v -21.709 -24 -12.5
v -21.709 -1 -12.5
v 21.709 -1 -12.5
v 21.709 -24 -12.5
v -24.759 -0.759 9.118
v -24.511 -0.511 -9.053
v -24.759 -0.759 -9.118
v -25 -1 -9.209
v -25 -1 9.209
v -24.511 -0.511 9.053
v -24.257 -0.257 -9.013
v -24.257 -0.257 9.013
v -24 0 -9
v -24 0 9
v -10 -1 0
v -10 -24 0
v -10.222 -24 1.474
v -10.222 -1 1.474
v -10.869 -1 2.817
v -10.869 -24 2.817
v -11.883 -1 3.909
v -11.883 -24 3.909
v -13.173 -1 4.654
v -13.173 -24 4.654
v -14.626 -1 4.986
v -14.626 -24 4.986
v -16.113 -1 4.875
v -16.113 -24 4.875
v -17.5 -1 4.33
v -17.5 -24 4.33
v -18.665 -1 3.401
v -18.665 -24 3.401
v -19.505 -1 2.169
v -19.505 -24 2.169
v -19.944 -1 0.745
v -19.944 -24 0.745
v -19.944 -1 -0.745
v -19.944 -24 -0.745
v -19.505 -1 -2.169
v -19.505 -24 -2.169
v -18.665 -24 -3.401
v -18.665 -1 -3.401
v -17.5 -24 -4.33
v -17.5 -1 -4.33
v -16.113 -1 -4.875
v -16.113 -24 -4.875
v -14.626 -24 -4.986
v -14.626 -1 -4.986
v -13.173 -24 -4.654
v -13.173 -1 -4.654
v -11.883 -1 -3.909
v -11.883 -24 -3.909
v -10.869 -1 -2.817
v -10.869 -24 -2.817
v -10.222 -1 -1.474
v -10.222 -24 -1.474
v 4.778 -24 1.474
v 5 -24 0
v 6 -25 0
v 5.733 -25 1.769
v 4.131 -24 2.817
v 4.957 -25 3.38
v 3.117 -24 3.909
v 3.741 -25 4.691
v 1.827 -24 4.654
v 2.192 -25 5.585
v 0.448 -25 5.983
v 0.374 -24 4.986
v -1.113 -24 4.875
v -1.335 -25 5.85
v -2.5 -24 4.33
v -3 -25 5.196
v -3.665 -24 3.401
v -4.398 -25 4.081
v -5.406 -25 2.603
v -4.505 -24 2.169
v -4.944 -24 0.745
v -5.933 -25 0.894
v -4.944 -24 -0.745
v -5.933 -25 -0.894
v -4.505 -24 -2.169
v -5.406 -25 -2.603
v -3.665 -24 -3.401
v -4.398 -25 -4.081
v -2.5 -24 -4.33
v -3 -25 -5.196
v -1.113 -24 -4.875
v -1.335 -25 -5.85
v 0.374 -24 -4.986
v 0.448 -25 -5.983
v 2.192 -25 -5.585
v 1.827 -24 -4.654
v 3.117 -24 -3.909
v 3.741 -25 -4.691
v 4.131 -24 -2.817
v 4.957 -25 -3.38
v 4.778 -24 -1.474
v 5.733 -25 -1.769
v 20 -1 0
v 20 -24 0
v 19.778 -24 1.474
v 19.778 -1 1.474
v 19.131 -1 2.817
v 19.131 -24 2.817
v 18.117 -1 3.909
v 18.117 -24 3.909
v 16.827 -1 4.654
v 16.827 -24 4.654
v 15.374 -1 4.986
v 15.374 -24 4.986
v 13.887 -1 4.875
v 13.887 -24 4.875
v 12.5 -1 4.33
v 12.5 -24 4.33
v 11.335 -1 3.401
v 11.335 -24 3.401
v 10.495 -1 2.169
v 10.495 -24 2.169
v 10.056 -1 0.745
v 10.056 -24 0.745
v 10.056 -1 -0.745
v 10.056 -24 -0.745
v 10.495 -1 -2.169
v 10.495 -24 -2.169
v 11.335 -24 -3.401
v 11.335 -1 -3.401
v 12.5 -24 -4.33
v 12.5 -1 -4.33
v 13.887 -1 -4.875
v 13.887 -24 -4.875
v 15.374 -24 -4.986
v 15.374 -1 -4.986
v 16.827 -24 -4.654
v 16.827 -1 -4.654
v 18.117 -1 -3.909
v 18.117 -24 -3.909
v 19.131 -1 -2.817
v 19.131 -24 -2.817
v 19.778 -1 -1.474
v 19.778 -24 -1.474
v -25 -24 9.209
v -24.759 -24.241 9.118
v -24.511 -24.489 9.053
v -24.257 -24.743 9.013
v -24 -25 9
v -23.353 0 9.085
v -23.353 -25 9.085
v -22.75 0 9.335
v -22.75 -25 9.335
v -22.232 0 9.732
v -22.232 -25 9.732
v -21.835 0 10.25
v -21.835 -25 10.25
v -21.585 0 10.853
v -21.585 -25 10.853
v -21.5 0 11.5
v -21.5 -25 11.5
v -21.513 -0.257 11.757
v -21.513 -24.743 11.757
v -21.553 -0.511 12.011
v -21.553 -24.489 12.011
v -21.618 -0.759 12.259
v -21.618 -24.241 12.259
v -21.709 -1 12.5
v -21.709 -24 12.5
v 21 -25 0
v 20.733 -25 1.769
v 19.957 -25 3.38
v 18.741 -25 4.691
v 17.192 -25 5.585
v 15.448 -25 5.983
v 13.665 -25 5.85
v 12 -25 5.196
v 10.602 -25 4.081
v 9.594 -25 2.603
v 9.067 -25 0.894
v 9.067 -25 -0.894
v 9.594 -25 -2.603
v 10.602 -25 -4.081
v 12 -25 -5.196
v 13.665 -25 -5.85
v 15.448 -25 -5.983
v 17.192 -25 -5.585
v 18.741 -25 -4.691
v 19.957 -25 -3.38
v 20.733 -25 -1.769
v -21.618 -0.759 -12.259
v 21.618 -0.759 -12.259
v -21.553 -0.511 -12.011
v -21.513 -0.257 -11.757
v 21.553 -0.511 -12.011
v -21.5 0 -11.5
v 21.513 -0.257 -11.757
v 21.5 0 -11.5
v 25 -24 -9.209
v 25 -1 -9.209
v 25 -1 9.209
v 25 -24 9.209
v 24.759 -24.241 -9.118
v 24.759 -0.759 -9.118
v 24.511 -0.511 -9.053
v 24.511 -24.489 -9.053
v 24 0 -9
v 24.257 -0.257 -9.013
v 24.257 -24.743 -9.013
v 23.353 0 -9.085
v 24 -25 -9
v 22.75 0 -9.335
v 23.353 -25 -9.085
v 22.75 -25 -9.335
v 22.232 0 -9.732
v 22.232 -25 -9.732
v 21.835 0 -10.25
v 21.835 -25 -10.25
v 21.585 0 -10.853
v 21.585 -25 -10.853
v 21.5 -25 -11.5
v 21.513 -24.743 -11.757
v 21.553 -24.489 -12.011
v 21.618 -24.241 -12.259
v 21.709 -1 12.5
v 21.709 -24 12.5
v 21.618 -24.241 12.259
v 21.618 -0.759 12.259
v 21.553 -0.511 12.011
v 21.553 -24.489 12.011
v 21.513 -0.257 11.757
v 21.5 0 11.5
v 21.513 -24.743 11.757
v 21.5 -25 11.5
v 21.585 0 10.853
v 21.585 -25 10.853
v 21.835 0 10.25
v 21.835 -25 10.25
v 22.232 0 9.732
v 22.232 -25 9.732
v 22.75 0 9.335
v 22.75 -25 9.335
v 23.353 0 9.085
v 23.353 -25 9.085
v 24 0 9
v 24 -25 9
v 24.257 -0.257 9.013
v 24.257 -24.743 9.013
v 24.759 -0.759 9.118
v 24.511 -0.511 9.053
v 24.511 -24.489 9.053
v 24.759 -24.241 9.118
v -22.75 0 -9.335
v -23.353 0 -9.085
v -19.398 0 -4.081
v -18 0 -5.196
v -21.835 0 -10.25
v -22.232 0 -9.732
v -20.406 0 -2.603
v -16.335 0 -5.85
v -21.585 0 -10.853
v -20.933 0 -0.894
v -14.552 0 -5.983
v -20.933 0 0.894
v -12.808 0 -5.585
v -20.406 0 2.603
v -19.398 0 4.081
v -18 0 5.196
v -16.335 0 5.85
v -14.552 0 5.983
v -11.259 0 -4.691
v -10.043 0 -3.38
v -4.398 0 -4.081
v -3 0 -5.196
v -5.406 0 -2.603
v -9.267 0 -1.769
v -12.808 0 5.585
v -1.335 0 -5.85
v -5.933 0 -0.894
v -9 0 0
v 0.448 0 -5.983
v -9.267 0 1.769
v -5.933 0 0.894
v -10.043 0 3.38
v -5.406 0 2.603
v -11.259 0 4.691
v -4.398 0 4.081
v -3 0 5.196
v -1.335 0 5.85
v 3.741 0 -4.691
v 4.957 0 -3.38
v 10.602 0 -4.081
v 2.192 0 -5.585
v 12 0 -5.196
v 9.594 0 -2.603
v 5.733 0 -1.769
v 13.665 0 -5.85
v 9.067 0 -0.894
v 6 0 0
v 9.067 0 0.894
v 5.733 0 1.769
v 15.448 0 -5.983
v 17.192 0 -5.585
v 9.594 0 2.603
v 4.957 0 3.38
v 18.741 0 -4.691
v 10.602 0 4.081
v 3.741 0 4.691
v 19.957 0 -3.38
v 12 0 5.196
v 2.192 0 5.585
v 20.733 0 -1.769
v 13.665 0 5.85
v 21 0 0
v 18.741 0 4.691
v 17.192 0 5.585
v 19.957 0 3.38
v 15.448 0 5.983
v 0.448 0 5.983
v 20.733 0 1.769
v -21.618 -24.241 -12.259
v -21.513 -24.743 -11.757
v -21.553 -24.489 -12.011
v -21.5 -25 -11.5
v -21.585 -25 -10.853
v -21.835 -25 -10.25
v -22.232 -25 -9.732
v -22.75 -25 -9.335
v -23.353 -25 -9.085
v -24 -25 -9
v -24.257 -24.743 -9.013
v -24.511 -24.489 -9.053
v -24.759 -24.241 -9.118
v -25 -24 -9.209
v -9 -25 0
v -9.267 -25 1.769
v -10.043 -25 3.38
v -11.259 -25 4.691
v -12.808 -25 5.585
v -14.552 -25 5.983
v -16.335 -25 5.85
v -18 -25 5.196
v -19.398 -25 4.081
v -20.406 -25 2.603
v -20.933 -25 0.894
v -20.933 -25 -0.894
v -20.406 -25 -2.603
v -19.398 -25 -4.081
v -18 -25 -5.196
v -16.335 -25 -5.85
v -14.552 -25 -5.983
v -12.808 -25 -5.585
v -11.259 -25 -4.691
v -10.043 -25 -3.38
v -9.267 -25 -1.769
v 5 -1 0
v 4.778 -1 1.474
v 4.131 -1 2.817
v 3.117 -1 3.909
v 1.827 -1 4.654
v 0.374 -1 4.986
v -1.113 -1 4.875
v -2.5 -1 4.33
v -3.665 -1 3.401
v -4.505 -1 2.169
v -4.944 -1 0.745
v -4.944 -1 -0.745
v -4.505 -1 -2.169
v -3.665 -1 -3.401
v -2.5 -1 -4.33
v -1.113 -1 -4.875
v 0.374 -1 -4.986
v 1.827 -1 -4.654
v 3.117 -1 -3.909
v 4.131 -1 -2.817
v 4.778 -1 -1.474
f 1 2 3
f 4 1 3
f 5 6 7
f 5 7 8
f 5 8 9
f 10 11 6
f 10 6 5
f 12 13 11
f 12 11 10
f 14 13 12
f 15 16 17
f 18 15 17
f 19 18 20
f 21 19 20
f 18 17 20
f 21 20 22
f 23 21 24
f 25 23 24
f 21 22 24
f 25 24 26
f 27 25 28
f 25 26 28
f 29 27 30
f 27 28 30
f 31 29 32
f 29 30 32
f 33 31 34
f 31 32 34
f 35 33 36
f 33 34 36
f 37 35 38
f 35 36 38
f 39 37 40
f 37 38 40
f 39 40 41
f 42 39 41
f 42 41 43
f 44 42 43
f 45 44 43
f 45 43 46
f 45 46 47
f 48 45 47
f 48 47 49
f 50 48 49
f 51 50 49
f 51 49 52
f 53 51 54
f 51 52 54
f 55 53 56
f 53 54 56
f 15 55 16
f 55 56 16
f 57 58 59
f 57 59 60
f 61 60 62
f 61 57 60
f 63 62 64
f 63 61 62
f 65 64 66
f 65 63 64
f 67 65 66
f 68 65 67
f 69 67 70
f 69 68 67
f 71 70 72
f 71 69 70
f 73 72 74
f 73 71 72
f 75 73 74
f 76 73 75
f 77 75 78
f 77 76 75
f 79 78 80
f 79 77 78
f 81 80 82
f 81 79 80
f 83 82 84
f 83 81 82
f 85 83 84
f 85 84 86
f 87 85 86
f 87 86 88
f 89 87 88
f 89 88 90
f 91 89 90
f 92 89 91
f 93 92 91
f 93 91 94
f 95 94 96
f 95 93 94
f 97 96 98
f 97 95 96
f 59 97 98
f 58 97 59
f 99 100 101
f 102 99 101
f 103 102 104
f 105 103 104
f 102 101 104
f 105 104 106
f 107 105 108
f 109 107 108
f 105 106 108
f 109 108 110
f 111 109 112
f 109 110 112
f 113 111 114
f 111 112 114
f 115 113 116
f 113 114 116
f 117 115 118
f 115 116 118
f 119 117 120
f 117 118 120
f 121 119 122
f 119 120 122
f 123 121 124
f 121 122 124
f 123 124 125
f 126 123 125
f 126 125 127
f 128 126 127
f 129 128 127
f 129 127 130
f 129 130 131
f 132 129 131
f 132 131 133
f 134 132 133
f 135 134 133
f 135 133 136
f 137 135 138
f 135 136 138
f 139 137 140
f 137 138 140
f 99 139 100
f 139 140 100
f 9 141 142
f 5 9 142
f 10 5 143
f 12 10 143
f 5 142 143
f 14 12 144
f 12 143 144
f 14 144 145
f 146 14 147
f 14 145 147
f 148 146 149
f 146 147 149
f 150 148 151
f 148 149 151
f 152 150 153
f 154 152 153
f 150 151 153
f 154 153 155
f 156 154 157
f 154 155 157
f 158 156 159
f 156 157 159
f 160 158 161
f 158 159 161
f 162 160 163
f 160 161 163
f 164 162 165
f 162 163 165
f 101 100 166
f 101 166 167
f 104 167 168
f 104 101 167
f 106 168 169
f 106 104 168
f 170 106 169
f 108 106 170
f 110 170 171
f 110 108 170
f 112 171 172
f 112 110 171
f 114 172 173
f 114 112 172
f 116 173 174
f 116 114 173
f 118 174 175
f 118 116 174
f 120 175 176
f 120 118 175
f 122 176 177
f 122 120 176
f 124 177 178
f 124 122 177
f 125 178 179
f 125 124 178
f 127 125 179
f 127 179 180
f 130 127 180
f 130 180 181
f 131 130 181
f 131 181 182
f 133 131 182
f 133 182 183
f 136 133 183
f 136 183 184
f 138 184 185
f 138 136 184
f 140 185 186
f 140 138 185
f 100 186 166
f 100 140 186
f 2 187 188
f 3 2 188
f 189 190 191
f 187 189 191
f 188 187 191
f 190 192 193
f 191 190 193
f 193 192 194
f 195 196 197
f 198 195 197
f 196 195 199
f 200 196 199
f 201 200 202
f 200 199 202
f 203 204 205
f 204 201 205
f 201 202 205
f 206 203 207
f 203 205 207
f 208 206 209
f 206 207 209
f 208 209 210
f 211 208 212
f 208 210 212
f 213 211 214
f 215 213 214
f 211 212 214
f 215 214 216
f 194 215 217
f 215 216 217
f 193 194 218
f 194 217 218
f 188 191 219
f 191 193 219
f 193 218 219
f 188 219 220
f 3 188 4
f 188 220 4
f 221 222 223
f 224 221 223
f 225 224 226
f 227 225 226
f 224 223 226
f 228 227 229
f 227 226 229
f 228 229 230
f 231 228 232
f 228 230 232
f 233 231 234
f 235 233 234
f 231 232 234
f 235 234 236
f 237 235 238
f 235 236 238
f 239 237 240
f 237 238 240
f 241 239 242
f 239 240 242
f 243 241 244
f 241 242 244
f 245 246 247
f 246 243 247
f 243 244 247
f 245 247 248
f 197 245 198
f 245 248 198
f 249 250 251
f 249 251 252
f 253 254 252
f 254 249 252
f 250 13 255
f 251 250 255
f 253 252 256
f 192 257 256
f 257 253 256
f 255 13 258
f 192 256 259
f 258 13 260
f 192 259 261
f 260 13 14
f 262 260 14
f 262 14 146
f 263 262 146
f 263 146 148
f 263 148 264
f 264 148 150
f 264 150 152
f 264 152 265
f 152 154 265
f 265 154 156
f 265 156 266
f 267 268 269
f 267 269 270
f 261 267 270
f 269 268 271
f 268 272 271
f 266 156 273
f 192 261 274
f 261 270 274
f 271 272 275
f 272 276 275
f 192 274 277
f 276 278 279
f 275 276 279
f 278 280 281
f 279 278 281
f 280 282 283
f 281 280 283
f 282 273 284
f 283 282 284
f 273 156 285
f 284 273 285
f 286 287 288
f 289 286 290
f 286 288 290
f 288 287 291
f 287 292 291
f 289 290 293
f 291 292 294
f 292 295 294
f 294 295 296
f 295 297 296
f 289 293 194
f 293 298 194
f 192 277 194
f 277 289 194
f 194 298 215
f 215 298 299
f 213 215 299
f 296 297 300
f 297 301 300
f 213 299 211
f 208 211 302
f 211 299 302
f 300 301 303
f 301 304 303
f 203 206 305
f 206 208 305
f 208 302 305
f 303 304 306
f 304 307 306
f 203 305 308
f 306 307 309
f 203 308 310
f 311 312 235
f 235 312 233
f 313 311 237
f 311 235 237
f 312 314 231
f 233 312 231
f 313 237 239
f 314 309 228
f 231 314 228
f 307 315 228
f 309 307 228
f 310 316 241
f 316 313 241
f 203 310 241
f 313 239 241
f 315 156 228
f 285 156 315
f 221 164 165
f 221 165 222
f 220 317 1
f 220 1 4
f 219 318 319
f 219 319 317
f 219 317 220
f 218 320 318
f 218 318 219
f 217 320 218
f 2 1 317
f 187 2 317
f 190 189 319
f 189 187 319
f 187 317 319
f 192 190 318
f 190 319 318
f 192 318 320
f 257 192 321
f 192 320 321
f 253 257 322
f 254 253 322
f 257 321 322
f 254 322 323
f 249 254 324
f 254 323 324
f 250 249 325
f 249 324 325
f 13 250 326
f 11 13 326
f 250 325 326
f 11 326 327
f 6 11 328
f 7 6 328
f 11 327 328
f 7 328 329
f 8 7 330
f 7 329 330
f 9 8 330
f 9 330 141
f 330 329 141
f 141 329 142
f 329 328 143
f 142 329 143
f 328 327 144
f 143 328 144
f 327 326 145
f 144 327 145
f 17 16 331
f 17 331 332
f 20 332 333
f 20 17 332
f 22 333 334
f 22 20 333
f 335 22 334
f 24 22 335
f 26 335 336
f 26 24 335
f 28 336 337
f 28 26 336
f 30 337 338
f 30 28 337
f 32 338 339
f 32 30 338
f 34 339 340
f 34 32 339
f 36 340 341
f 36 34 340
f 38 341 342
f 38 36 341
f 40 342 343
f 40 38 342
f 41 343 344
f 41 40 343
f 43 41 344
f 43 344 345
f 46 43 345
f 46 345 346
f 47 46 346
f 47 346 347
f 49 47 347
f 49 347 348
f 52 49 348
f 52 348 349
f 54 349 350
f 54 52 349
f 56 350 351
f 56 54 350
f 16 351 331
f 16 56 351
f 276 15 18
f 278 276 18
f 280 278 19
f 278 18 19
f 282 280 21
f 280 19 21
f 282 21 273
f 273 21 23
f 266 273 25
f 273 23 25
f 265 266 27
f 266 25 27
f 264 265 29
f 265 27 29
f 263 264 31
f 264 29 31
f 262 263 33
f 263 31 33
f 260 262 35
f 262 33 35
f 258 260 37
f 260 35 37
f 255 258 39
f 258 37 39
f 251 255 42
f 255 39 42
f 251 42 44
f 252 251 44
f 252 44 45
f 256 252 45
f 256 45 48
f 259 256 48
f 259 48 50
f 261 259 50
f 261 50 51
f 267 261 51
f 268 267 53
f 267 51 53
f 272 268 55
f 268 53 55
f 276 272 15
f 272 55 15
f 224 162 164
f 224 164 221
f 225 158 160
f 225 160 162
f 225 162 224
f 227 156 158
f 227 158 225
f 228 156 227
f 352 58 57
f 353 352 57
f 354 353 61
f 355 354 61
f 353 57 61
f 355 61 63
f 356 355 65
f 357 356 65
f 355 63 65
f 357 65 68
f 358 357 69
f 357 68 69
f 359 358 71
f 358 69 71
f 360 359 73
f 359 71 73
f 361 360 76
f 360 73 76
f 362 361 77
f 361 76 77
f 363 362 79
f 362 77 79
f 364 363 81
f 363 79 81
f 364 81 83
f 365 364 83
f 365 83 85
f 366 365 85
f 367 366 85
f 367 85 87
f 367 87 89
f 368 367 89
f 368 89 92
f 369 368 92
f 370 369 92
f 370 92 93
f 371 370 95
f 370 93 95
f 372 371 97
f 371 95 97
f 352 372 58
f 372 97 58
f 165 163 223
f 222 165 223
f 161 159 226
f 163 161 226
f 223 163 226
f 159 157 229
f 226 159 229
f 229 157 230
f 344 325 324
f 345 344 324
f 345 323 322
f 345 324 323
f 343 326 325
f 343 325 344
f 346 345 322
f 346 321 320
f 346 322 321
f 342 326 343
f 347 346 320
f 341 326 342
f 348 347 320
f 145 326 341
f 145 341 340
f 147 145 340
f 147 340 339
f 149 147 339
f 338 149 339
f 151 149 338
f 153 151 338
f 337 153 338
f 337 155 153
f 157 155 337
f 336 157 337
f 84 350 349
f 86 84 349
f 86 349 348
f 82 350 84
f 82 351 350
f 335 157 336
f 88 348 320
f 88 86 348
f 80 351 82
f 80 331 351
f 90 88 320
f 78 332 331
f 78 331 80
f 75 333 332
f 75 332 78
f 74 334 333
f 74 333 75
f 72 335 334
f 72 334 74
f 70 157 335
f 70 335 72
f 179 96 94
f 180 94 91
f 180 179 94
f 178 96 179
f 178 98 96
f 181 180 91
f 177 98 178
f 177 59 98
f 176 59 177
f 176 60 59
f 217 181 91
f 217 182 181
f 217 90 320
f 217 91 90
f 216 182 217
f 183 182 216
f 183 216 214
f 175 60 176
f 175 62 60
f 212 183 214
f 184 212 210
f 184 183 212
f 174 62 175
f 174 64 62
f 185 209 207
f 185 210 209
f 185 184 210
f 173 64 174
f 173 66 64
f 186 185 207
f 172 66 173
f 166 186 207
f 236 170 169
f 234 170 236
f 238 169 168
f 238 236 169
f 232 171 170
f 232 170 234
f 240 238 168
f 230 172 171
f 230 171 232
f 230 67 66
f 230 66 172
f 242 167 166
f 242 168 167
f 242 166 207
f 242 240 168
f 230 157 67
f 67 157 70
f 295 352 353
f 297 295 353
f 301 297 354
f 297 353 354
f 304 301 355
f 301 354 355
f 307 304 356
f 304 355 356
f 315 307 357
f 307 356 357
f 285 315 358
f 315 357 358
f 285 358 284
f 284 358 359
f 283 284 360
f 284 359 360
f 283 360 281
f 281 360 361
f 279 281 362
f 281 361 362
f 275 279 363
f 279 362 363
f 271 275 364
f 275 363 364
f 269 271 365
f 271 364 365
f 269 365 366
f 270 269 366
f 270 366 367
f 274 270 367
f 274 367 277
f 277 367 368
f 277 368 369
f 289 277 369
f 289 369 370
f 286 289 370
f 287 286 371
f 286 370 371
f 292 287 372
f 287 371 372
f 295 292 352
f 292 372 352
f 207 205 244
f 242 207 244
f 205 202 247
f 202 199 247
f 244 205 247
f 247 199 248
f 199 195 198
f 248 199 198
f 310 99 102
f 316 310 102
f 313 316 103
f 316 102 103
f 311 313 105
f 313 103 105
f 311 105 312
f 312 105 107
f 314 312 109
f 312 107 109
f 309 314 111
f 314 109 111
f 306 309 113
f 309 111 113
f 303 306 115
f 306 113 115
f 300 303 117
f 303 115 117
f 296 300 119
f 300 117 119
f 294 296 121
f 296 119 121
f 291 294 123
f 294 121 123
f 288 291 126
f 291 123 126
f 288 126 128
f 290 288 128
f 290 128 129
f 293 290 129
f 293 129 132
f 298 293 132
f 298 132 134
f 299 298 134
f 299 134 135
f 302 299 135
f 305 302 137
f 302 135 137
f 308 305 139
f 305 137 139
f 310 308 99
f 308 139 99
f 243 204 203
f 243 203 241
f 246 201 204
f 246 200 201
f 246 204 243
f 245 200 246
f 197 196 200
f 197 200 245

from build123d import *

# Parameters (mm, degrees)
F0_W     = 50
F0_H     = 25
F1_DEPTH = 25
F2_R     = 5
F3_DEPTH = 25
F4_SIZE  = 1
F5_R     = 2.5
F6_DEPTH = 25


with BuildPart() as f1:
    # F0 (on Front) → F1 (new body)
    with BuildSketch(Plane.XZ):
        Rectangle(F0_W, F0_H)
    extrude(amount=F1_DEPTH)

    # F2 (on face) → F3 (cut)
    with BuildSketch(Plane.XZ.offset(25)):
        Circle(F2_R)
        with Locations((15, 0)):
            Circle(F2_R)
        with Locations((-15, 0)):
            Circle(F2_R)
    extrude(amount=-F3_DEPTH, mode=Mode.SUBTRACT)

    # F4
    f4_edges = [f1.edges().sort_by_distance(p)[0] for p in [
        (0, -25, -12.5),
        (-25, -25, 0),
        (25, -25, 0),
        (0, -25, 12.5),
        (-20, -25, 0),
        (-5, -25, 0),
        (10, -25, 0),
        (0, 0, -12.5),
        (-25, 0, 0),
        (25, 0, 0),
        (0, 0, 12.5),
        (-20, 0, 0),
        (-5, 0, 0),
        (10, 0, 0),
    ]]
    chamfer(f4_edges, length=F4_SIZE)

    # F5 (on face) → F6 (cut)
    with BuildSketch(Plane.XZ.offset(25)):
        with Locations((-24, 11.5)):
            Circle(F5_R)
        with Locations((24, 11.5)):
            Circle(F5_R)
        with Locations((24, -11.5)):
            Circle(F5_R)
        with Locations((-24, -11.5)):
            Circle(F5_R)
    extrude(amount=-F6_DEPTH, mode=Mode.SUBTRACT)


solid = f1.part
